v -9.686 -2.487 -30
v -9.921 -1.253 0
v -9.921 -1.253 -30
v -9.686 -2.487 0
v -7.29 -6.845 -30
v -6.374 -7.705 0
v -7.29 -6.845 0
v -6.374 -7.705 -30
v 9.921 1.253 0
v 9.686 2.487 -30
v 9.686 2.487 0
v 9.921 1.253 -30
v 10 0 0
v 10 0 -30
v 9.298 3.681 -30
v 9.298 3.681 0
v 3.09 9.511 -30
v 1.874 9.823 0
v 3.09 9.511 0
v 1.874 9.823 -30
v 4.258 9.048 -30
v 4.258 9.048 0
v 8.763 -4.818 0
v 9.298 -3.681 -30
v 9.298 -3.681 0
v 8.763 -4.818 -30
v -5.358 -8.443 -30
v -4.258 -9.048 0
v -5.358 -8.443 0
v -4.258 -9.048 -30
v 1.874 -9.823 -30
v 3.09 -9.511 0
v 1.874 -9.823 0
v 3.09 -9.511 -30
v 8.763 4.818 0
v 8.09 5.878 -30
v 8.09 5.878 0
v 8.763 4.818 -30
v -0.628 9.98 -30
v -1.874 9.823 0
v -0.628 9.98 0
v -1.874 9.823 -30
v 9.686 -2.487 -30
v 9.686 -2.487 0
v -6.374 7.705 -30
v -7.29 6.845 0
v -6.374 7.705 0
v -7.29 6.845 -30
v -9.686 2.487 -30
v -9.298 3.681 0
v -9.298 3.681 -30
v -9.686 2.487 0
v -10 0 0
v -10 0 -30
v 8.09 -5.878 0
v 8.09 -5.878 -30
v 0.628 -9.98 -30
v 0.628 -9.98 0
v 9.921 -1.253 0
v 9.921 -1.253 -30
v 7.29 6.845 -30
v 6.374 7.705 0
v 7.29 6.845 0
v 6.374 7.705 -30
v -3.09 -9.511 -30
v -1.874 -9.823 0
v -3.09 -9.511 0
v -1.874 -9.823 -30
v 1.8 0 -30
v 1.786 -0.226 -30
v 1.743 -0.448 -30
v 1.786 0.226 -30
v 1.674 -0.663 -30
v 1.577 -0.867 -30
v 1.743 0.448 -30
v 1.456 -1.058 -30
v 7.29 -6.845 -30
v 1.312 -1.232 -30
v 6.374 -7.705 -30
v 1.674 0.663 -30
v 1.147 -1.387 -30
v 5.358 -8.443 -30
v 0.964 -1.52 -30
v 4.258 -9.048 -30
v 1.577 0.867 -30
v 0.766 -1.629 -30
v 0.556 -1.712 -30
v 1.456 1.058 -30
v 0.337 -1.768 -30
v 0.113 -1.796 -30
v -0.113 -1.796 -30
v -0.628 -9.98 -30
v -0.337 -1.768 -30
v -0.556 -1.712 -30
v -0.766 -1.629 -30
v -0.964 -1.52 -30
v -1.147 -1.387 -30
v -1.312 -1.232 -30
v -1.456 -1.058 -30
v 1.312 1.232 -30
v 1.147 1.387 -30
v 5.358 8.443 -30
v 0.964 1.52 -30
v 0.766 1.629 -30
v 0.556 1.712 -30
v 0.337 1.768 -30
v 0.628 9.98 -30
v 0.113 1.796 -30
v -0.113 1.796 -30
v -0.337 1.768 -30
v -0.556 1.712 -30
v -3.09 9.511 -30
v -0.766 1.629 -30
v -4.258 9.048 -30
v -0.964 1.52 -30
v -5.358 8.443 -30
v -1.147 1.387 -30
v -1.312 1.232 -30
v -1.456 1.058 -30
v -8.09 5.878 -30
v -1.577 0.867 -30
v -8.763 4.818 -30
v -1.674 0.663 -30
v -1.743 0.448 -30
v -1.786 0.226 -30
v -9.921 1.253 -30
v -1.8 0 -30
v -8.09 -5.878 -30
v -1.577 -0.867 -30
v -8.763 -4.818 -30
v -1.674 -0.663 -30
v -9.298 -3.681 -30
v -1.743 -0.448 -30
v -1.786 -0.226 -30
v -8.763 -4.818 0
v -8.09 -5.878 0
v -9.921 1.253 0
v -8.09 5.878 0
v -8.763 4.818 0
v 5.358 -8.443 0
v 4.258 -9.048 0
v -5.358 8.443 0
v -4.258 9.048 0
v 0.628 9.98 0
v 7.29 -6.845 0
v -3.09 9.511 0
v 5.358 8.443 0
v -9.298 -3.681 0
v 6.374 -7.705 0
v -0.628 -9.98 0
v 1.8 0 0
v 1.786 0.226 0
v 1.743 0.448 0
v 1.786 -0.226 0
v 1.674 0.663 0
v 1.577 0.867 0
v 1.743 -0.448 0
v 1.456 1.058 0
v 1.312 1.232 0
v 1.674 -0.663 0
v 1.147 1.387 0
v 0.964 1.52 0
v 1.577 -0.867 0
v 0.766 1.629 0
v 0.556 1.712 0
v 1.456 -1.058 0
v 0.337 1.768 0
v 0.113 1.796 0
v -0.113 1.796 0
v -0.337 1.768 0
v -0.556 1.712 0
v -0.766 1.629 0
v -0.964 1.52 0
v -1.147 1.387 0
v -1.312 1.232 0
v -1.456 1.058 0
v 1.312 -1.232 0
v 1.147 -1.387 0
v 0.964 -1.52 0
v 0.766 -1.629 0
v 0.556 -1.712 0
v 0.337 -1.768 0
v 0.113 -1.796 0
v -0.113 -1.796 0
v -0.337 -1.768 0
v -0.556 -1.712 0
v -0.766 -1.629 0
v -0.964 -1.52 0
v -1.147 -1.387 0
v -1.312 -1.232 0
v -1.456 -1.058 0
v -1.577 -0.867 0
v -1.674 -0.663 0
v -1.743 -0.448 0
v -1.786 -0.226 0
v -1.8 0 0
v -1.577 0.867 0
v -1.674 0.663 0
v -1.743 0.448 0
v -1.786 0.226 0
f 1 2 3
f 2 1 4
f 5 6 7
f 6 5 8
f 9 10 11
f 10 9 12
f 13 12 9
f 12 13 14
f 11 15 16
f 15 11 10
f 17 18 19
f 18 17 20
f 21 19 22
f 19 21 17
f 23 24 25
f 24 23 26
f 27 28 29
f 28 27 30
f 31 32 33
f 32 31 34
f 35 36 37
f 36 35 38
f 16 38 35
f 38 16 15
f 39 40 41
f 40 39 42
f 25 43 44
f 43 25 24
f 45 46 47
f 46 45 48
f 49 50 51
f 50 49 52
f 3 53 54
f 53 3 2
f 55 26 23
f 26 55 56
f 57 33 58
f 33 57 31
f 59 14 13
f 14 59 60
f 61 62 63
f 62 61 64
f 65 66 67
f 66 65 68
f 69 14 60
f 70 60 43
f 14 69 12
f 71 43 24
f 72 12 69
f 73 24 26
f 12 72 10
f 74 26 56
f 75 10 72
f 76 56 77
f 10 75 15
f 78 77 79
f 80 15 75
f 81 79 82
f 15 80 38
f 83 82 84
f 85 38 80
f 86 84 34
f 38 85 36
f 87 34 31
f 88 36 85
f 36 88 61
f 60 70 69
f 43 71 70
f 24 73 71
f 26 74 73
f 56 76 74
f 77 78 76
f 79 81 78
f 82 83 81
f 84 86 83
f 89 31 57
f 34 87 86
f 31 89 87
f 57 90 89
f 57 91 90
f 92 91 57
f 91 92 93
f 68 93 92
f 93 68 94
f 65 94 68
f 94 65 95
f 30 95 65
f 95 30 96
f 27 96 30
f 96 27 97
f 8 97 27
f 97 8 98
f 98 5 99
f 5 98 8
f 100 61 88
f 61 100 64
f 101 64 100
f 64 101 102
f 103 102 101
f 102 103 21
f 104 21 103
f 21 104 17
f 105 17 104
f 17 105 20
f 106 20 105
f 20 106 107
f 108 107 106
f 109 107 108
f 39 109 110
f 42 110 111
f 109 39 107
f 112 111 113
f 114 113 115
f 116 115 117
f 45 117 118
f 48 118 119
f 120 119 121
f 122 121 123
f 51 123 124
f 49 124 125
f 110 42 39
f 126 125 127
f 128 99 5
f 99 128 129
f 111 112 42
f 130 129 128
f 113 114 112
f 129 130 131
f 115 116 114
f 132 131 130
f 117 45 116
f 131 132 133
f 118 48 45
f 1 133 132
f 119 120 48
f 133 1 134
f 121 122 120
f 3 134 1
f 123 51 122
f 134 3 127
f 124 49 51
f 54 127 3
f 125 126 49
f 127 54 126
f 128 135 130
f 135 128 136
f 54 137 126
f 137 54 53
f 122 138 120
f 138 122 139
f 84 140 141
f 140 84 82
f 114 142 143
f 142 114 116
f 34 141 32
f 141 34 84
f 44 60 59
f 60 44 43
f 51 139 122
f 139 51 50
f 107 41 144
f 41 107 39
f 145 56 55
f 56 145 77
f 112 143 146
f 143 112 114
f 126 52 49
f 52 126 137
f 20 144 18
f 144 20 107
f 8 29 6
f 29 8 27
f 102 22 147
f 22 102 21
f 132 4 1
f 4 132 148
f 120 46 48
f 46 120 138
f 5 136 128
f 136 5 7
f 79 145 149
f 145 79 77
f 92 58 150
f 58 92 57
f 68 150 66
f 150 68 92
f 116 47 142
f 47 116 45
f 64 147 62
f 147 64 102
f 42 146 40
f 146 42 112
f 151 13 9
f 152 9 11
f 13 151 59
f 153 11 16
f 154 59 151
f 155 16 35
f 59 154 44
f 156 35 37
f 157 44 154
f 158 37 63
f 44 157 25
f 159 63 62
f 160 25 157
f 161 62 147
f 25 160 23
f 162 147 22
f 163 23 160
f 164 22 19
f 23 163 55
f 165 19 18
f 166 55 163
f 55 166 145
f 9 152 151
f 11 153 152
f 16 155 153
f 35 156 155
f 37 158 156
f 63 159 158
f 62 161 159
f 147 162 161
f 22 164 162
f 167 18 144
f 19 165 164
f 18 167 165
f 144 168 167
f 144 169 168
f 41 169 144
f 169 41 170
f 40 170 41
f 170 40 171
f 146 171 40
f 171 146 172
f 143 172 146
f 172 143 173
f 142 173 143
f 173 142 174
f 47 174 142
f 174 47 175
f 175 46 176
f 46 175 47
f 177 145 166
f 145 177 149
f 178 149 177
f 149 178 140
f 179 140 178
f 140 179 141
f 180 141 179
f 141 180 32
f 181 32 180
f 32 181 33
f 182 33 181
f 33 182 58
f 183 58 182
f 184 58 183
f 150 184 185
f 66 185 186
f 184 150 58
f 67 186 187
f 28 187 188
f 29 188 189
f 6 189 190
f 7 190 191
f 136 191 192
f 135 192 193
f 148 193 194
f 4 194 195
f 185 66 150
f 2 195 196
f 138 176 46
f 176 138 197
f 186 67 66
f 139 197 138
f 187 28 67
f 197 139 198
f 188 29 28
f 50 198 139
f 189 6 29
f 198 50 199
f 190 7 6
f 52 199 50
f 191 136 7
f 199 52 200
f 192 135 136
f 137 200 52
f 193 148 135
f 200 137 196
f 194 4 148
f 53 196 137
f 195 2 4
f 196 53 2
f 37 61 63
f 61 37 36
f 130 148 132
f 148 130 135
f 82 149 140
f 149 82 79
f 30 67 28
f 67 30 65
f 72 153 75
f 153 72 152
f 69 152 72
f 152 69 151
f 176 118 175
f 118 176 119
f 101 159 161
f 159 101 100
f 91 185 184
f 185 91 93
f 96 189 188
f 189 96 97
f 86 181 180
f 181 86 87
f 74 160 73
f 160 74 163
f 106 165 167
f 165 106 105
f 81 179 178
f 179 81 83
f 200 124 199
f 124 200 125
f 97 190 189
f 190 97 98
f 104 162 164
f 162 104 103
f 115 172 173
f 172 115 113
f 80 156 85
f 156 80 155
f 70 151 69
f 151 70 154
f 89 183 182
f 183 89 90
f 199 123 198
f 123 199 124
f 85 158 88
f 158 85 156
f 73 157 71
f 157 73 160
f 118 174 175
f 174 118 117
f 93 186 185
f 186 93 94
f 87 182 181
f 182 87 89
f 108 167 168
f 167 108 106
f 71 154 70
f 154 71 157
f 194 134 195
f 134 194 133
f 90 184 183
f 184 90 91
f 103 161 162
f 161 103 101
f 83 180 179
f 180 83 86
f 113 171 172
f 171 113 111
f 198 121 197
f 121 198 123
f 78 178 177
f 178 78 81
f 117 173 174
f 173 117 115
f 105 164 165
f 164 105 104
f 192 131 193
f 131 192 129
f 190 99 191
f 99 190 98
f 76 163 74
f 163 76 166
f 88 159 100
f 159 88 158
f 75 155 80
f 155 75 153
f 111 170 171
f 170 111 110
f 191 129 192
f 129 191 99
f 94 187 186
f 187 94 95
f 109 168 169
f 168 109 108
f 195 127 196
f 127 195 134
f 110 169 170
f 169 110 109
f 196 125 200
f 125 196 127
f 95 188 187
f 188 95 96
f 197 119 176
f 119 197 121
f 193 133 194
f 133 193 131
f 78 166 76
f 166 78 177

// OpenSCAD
$fn = 50;


difference() {
	union() {
		translate(v = [0, 0, -30.0000000000]) {
			cylinder(h = 30, r = 10.0000000000);
		}
		cylinder(h = 0, r = 19.0000000000);
	}
	union() {
		#translate(v = [0, 0, -30]) {
			cylinder(h = 30, r = 1.8000000000);
		}
	}
}
